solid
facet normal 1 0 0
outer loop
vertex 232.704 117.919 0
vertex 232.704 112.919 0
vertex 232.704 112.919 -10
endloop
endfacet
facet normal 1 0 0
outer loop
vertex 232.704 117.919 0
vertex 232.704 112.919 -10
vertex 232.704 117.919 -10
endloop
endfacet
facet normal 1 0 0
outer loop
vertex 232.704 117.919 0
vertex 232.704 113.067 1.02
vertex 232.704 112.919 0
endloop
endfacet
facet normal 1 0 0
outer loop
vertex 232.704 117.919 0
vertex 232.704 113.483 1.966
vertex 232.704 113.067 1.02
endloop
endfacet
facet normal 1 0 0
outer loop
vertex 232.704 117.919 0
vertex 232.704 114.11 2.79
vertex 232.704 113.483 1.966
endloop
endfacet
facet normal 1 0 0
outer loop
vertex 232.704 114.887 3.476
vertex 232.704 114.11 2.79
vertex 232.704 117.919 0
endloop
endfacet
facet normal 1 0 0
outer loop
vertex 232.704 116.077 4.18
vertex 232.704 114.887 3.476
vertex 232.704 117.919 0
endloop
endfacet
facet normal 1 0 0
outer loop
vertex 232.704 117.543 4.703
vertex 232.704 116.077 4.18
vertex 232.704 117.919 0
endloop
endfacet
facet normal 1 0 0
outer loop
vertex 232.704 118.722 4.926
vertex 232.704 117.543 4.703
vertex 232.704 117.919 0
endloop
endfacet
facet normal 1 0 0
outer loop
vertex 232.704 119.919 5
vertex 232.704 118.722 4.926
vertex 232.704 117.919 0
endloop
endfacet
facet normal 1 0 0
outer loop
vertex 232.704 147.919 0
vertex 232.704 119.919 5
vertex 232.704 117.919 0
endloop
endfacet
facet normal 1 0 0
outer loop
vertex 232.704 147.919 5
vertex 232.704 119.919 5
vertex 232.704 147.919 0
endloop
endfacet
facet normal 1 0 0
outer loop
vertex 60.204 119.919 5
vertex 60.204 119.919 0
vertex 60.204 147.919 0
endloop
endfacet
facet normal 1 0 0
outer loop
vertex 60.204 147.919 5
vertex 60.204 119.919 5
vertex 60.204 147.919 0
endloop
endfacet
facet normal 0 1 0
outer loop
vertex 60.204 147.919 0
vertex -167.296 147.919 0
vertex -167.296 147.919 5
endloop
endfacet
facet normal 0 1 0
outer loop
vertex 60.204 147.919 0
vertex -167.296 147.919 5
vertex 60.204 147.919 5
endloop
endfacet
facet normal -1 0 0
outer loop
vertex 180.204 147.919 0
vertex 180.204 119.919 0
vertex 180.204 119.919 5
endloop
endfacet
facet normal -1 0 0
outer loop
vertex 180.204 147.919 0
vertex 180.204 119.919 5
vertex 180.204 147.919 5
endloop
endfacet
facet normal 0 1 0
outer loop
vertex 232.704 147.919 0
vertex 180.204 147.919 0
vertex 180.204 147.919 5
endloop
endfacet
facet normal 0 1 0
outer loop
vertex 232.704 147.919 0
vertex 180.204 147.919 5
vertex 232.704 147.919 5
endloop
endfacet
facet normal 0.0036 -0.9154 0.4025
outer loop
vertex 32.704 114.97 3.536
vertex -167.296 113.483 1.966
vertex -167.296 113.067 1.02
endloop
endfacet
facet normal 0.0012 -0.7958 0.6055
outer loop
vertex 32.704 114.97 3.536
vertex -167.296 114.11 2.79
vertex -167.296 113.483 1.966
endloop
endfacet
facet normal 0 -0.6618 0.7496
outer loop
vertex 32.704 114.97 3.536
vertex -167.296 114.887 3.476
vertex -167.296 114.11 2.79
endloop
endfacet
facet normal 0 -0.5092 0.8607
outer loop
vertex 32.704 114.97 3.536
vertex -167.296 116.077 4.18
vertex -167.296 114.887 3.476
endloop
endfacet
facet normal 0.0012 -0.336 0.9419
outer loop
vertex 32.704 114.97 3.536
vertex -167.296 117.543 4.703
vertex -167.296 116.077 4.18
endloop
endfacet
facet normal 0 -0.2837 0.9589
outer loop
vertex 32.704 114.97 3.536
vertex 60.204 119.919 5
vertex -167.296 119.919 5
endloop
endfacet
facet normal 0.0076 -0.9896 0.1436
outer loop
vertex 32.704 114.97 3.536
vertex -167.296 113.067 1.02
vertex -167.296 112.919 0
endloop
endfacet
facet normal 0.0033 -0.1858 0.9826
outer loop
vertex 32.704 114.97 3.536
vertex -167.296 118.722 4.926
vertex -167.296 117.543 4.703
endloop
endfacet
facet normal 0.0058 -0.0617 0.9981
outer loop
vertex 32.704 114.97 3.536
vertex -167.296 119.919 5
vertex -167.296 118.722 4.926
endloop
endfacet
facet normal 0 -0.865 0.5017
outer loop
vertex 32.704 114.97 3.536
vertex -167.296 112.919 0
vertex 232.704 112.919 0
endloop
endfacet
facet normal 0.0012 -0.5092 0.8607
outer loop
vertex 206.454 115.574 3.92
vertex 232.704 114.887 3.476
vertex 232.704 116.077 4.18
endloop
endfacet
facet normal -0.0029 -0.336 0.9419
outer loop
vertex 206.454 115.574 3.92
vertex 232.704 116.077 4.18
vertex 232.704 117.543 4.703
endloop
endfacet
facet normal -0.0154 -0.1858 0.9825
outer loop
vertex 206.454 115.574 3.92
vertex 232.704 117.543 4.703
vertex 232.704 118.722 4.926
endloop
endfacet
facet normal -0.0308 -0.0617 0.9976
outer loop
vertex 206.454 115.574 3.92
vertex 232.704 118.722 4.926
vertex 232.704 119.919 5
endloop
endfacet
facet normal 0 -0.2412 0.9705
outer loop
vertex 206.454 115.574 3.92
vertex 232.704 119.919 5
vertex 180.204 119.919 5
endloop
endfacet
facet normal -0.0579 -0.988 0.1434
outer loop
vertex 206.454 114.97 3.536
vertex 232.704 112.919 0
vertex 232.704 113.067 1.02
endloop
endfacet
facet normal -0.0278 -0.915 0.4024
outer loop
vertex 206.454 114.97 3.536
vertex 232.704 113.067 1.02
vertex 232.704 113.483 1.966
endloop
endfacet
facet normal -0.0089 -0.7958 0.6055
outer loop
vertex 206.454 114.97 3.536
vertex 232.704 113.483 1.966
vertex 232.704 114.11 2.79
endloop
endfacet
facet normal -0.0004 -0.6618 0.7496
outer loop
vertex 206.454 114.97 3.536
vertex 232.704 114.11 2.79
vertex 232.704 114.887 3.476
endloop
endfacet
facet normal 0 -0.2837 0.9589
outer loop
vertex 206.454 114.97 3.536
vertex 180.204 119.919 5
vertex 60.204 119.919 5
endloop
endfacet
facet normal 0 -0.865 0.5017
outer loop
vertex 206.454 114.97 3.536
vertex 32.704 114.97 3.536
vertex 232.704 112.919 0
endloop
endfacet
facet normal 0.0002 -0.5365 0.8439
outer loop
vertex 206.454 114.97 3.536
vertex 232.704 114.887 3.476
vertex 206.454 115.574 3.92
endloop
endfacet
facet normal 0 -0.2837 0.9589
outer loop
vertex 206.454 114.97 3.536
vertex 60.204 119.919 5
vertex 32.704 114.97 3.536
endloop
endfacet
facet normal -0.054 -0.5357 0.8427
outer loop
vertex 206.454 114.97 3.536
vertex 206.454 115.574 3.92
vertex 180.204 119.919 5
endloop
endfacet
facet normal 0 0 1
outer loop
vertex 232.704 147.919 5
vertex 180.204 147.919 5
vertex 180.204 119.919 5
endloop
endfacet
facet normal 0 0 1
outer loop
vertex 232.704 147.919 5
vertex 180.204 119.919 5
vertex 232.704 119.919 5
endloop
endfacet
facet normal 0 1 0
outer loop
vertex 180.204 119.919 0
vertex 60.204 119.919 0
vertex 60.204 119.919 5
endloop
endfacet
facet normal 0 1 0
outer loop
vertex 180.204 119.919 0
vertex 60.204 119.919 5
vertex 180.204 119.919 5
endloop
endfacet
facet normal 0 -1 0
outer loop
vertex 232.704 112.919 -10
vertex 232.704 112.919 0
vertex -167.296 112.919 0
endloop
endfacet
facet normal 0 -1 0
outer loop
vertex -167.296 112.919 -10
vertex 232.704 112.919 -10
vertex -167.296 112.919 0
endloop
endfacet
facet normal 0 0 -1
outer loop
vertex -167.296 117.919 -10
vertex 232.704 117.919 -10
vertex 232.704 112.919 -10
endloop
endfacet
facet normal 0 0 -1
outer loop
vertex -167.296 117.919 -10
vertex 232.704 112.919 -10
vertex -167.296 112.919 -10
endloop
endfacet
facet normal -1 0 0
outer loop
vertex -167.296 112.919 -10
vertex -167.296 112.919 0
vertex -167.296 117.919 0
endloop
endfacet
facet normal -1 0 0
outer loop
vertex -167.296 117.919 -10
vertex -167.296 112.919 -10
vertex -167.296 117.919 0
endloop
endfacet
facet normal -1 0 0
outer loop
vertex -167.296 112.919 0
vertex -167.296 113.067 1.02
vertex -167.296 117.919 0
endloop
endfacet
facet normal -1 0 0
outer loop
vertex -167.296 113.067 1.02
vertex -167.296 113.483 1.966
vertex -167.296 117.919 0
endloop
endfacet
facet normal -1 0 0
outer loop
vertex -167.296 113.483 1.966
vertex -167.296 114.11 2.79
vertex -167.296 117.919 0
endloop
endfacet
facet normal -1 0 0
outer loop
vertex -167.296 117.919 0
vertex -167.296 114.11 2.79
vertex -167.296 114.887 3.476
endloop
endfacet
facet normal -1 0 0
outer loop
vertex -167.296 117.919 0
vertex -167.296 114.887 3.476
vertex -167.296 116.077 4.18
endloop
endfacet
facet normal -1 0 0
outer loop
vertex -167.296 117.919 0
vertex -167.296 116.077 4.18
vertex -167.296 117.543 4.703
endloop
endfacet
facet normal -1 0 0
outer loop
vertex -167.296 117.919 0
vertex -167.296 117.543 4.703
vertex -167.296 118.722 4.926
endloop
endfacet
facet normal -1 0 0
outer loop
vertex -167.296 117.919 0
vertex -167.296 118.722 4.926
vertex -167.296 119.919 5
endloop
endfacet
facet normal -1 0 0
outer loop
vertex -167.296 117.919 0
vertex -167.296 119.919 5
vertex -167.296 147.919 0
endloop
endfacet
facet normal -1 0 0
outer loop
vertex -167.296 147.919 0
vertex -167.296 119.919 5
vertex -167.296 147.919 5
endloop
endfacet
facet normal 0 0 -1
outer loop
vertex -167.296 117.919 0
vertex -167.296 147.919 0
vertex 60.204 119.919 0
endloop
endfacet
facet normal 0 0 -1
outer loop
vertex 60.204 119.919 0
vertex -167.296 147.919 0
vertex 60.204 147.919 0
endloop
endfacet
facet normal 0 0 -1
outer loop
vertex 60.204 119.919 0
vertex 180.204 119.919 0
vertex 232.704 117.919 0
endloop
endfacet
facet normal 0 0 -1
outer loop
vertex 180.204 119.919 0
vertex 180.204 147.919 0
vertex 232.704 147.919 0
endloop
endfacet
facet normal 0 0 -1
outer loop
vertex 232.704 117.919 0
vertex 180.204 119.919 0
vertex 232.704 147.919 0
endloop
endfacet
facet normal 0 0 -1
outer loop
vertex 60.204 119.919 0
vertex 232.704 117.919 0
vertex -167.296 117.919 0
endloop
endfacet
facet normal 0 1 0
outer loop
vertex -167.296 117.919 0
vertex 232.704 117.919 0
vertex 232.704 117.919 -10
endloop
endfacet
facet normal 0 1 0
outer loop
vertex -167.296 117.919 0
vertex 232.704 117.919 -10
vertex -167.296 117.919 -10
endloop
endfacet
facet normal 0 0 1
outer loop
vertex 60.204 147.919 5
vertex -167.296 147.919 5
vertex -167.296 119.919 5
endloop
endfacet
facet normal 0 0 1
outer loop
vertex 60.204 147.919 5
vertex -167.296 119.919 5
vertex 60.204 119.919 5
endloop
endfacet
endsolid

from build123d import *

# Parameters (mm, degrees)
SKETCH_1_W              = 400
SKETCH_1_H              = 35
EXTRUDE_1_DEPTH         = 5
SKETCH_2_W              = 400
SKETCH_2_H              = 5
EXTRUDE_2_DEPTH         = 10
FILLET_1_SIZE           = 7
FILLET_1_SIZE_2         = 5
CUT_EXTRUDE_START       = -5
CUT_EXTRUDE_1_OUTLINE_W = 120
CUT_EXTRUDE_1_OUTLINE_H = 28
CUT_EXTRUDE_1_DEPTH     = 5


# Read off the part's stored shape, not the designer's step: 切除-拉伸1
with BuildPart() as part:
    # 草图1 → 凸台-拉伸1 (new body)
    with BuildSketch(Plane.XY):
        with Locations((32.704402516, 130.419346185)):
            Rectangle(SKETCH_1_W, SKETCH_1_H)
    extrude(amount=EXTRUDE_1_DEPTH)

    # 草图2 → 凸台-拉伸2 (add)
    with BuildSketch(Plane(origin=(0, 0, 0), x_dir=(-1, 0, 0), z_dir=(0, 0, -1))):
        with Locations((-32.704402516, 115.419346185)):
            Rectangle(SKETCH_2_W, SKETCH_2_H)
    extrude(amount=EXTRUDE_2_DEPTH)

    # 圆角1
    # an asymmetric fillet: 7, 5 mm, written as the material it takes off along each edge
    with BuildSketch(Plane(origin=(250.204402516, 112.919346185, 5), x_dir=(0, 1, 0), z_dir=(-1, 0, 0))) as fillet_1_piece_1:
        with BuildLine():
            Bezier((FILLET_1_SIZE, 0), (0, 0), (0, FILLET_1_SIZE_2), weights=[1, 0.707106781, 1])
            Line((0, FILLET_1_SIZE_2), (0, 0))
            Line((0, 0), (FILLET_1_SIZE, 0))
        make_face()
    extrude(amount=435, mode=Mode.SUBTRACT)

    # 切除-拉伸1 outline → 切除-拉伸1 (cut)
    with BuildSketch(Plane.XY.offset(5).offset(CUT_EXTRUDE_START)):
        with Locations((120.204402516, 133.919346185)):
            Rectangle(CUT_EXTRUDE_1_OUTLINE_W, CUT_EXTRUDE_1_OUTLINE_H)
    extrude(amount=CUT_EXTRUDE_1_DEPTH, mode=Mode.SUBTRACT)


solid = part.part
